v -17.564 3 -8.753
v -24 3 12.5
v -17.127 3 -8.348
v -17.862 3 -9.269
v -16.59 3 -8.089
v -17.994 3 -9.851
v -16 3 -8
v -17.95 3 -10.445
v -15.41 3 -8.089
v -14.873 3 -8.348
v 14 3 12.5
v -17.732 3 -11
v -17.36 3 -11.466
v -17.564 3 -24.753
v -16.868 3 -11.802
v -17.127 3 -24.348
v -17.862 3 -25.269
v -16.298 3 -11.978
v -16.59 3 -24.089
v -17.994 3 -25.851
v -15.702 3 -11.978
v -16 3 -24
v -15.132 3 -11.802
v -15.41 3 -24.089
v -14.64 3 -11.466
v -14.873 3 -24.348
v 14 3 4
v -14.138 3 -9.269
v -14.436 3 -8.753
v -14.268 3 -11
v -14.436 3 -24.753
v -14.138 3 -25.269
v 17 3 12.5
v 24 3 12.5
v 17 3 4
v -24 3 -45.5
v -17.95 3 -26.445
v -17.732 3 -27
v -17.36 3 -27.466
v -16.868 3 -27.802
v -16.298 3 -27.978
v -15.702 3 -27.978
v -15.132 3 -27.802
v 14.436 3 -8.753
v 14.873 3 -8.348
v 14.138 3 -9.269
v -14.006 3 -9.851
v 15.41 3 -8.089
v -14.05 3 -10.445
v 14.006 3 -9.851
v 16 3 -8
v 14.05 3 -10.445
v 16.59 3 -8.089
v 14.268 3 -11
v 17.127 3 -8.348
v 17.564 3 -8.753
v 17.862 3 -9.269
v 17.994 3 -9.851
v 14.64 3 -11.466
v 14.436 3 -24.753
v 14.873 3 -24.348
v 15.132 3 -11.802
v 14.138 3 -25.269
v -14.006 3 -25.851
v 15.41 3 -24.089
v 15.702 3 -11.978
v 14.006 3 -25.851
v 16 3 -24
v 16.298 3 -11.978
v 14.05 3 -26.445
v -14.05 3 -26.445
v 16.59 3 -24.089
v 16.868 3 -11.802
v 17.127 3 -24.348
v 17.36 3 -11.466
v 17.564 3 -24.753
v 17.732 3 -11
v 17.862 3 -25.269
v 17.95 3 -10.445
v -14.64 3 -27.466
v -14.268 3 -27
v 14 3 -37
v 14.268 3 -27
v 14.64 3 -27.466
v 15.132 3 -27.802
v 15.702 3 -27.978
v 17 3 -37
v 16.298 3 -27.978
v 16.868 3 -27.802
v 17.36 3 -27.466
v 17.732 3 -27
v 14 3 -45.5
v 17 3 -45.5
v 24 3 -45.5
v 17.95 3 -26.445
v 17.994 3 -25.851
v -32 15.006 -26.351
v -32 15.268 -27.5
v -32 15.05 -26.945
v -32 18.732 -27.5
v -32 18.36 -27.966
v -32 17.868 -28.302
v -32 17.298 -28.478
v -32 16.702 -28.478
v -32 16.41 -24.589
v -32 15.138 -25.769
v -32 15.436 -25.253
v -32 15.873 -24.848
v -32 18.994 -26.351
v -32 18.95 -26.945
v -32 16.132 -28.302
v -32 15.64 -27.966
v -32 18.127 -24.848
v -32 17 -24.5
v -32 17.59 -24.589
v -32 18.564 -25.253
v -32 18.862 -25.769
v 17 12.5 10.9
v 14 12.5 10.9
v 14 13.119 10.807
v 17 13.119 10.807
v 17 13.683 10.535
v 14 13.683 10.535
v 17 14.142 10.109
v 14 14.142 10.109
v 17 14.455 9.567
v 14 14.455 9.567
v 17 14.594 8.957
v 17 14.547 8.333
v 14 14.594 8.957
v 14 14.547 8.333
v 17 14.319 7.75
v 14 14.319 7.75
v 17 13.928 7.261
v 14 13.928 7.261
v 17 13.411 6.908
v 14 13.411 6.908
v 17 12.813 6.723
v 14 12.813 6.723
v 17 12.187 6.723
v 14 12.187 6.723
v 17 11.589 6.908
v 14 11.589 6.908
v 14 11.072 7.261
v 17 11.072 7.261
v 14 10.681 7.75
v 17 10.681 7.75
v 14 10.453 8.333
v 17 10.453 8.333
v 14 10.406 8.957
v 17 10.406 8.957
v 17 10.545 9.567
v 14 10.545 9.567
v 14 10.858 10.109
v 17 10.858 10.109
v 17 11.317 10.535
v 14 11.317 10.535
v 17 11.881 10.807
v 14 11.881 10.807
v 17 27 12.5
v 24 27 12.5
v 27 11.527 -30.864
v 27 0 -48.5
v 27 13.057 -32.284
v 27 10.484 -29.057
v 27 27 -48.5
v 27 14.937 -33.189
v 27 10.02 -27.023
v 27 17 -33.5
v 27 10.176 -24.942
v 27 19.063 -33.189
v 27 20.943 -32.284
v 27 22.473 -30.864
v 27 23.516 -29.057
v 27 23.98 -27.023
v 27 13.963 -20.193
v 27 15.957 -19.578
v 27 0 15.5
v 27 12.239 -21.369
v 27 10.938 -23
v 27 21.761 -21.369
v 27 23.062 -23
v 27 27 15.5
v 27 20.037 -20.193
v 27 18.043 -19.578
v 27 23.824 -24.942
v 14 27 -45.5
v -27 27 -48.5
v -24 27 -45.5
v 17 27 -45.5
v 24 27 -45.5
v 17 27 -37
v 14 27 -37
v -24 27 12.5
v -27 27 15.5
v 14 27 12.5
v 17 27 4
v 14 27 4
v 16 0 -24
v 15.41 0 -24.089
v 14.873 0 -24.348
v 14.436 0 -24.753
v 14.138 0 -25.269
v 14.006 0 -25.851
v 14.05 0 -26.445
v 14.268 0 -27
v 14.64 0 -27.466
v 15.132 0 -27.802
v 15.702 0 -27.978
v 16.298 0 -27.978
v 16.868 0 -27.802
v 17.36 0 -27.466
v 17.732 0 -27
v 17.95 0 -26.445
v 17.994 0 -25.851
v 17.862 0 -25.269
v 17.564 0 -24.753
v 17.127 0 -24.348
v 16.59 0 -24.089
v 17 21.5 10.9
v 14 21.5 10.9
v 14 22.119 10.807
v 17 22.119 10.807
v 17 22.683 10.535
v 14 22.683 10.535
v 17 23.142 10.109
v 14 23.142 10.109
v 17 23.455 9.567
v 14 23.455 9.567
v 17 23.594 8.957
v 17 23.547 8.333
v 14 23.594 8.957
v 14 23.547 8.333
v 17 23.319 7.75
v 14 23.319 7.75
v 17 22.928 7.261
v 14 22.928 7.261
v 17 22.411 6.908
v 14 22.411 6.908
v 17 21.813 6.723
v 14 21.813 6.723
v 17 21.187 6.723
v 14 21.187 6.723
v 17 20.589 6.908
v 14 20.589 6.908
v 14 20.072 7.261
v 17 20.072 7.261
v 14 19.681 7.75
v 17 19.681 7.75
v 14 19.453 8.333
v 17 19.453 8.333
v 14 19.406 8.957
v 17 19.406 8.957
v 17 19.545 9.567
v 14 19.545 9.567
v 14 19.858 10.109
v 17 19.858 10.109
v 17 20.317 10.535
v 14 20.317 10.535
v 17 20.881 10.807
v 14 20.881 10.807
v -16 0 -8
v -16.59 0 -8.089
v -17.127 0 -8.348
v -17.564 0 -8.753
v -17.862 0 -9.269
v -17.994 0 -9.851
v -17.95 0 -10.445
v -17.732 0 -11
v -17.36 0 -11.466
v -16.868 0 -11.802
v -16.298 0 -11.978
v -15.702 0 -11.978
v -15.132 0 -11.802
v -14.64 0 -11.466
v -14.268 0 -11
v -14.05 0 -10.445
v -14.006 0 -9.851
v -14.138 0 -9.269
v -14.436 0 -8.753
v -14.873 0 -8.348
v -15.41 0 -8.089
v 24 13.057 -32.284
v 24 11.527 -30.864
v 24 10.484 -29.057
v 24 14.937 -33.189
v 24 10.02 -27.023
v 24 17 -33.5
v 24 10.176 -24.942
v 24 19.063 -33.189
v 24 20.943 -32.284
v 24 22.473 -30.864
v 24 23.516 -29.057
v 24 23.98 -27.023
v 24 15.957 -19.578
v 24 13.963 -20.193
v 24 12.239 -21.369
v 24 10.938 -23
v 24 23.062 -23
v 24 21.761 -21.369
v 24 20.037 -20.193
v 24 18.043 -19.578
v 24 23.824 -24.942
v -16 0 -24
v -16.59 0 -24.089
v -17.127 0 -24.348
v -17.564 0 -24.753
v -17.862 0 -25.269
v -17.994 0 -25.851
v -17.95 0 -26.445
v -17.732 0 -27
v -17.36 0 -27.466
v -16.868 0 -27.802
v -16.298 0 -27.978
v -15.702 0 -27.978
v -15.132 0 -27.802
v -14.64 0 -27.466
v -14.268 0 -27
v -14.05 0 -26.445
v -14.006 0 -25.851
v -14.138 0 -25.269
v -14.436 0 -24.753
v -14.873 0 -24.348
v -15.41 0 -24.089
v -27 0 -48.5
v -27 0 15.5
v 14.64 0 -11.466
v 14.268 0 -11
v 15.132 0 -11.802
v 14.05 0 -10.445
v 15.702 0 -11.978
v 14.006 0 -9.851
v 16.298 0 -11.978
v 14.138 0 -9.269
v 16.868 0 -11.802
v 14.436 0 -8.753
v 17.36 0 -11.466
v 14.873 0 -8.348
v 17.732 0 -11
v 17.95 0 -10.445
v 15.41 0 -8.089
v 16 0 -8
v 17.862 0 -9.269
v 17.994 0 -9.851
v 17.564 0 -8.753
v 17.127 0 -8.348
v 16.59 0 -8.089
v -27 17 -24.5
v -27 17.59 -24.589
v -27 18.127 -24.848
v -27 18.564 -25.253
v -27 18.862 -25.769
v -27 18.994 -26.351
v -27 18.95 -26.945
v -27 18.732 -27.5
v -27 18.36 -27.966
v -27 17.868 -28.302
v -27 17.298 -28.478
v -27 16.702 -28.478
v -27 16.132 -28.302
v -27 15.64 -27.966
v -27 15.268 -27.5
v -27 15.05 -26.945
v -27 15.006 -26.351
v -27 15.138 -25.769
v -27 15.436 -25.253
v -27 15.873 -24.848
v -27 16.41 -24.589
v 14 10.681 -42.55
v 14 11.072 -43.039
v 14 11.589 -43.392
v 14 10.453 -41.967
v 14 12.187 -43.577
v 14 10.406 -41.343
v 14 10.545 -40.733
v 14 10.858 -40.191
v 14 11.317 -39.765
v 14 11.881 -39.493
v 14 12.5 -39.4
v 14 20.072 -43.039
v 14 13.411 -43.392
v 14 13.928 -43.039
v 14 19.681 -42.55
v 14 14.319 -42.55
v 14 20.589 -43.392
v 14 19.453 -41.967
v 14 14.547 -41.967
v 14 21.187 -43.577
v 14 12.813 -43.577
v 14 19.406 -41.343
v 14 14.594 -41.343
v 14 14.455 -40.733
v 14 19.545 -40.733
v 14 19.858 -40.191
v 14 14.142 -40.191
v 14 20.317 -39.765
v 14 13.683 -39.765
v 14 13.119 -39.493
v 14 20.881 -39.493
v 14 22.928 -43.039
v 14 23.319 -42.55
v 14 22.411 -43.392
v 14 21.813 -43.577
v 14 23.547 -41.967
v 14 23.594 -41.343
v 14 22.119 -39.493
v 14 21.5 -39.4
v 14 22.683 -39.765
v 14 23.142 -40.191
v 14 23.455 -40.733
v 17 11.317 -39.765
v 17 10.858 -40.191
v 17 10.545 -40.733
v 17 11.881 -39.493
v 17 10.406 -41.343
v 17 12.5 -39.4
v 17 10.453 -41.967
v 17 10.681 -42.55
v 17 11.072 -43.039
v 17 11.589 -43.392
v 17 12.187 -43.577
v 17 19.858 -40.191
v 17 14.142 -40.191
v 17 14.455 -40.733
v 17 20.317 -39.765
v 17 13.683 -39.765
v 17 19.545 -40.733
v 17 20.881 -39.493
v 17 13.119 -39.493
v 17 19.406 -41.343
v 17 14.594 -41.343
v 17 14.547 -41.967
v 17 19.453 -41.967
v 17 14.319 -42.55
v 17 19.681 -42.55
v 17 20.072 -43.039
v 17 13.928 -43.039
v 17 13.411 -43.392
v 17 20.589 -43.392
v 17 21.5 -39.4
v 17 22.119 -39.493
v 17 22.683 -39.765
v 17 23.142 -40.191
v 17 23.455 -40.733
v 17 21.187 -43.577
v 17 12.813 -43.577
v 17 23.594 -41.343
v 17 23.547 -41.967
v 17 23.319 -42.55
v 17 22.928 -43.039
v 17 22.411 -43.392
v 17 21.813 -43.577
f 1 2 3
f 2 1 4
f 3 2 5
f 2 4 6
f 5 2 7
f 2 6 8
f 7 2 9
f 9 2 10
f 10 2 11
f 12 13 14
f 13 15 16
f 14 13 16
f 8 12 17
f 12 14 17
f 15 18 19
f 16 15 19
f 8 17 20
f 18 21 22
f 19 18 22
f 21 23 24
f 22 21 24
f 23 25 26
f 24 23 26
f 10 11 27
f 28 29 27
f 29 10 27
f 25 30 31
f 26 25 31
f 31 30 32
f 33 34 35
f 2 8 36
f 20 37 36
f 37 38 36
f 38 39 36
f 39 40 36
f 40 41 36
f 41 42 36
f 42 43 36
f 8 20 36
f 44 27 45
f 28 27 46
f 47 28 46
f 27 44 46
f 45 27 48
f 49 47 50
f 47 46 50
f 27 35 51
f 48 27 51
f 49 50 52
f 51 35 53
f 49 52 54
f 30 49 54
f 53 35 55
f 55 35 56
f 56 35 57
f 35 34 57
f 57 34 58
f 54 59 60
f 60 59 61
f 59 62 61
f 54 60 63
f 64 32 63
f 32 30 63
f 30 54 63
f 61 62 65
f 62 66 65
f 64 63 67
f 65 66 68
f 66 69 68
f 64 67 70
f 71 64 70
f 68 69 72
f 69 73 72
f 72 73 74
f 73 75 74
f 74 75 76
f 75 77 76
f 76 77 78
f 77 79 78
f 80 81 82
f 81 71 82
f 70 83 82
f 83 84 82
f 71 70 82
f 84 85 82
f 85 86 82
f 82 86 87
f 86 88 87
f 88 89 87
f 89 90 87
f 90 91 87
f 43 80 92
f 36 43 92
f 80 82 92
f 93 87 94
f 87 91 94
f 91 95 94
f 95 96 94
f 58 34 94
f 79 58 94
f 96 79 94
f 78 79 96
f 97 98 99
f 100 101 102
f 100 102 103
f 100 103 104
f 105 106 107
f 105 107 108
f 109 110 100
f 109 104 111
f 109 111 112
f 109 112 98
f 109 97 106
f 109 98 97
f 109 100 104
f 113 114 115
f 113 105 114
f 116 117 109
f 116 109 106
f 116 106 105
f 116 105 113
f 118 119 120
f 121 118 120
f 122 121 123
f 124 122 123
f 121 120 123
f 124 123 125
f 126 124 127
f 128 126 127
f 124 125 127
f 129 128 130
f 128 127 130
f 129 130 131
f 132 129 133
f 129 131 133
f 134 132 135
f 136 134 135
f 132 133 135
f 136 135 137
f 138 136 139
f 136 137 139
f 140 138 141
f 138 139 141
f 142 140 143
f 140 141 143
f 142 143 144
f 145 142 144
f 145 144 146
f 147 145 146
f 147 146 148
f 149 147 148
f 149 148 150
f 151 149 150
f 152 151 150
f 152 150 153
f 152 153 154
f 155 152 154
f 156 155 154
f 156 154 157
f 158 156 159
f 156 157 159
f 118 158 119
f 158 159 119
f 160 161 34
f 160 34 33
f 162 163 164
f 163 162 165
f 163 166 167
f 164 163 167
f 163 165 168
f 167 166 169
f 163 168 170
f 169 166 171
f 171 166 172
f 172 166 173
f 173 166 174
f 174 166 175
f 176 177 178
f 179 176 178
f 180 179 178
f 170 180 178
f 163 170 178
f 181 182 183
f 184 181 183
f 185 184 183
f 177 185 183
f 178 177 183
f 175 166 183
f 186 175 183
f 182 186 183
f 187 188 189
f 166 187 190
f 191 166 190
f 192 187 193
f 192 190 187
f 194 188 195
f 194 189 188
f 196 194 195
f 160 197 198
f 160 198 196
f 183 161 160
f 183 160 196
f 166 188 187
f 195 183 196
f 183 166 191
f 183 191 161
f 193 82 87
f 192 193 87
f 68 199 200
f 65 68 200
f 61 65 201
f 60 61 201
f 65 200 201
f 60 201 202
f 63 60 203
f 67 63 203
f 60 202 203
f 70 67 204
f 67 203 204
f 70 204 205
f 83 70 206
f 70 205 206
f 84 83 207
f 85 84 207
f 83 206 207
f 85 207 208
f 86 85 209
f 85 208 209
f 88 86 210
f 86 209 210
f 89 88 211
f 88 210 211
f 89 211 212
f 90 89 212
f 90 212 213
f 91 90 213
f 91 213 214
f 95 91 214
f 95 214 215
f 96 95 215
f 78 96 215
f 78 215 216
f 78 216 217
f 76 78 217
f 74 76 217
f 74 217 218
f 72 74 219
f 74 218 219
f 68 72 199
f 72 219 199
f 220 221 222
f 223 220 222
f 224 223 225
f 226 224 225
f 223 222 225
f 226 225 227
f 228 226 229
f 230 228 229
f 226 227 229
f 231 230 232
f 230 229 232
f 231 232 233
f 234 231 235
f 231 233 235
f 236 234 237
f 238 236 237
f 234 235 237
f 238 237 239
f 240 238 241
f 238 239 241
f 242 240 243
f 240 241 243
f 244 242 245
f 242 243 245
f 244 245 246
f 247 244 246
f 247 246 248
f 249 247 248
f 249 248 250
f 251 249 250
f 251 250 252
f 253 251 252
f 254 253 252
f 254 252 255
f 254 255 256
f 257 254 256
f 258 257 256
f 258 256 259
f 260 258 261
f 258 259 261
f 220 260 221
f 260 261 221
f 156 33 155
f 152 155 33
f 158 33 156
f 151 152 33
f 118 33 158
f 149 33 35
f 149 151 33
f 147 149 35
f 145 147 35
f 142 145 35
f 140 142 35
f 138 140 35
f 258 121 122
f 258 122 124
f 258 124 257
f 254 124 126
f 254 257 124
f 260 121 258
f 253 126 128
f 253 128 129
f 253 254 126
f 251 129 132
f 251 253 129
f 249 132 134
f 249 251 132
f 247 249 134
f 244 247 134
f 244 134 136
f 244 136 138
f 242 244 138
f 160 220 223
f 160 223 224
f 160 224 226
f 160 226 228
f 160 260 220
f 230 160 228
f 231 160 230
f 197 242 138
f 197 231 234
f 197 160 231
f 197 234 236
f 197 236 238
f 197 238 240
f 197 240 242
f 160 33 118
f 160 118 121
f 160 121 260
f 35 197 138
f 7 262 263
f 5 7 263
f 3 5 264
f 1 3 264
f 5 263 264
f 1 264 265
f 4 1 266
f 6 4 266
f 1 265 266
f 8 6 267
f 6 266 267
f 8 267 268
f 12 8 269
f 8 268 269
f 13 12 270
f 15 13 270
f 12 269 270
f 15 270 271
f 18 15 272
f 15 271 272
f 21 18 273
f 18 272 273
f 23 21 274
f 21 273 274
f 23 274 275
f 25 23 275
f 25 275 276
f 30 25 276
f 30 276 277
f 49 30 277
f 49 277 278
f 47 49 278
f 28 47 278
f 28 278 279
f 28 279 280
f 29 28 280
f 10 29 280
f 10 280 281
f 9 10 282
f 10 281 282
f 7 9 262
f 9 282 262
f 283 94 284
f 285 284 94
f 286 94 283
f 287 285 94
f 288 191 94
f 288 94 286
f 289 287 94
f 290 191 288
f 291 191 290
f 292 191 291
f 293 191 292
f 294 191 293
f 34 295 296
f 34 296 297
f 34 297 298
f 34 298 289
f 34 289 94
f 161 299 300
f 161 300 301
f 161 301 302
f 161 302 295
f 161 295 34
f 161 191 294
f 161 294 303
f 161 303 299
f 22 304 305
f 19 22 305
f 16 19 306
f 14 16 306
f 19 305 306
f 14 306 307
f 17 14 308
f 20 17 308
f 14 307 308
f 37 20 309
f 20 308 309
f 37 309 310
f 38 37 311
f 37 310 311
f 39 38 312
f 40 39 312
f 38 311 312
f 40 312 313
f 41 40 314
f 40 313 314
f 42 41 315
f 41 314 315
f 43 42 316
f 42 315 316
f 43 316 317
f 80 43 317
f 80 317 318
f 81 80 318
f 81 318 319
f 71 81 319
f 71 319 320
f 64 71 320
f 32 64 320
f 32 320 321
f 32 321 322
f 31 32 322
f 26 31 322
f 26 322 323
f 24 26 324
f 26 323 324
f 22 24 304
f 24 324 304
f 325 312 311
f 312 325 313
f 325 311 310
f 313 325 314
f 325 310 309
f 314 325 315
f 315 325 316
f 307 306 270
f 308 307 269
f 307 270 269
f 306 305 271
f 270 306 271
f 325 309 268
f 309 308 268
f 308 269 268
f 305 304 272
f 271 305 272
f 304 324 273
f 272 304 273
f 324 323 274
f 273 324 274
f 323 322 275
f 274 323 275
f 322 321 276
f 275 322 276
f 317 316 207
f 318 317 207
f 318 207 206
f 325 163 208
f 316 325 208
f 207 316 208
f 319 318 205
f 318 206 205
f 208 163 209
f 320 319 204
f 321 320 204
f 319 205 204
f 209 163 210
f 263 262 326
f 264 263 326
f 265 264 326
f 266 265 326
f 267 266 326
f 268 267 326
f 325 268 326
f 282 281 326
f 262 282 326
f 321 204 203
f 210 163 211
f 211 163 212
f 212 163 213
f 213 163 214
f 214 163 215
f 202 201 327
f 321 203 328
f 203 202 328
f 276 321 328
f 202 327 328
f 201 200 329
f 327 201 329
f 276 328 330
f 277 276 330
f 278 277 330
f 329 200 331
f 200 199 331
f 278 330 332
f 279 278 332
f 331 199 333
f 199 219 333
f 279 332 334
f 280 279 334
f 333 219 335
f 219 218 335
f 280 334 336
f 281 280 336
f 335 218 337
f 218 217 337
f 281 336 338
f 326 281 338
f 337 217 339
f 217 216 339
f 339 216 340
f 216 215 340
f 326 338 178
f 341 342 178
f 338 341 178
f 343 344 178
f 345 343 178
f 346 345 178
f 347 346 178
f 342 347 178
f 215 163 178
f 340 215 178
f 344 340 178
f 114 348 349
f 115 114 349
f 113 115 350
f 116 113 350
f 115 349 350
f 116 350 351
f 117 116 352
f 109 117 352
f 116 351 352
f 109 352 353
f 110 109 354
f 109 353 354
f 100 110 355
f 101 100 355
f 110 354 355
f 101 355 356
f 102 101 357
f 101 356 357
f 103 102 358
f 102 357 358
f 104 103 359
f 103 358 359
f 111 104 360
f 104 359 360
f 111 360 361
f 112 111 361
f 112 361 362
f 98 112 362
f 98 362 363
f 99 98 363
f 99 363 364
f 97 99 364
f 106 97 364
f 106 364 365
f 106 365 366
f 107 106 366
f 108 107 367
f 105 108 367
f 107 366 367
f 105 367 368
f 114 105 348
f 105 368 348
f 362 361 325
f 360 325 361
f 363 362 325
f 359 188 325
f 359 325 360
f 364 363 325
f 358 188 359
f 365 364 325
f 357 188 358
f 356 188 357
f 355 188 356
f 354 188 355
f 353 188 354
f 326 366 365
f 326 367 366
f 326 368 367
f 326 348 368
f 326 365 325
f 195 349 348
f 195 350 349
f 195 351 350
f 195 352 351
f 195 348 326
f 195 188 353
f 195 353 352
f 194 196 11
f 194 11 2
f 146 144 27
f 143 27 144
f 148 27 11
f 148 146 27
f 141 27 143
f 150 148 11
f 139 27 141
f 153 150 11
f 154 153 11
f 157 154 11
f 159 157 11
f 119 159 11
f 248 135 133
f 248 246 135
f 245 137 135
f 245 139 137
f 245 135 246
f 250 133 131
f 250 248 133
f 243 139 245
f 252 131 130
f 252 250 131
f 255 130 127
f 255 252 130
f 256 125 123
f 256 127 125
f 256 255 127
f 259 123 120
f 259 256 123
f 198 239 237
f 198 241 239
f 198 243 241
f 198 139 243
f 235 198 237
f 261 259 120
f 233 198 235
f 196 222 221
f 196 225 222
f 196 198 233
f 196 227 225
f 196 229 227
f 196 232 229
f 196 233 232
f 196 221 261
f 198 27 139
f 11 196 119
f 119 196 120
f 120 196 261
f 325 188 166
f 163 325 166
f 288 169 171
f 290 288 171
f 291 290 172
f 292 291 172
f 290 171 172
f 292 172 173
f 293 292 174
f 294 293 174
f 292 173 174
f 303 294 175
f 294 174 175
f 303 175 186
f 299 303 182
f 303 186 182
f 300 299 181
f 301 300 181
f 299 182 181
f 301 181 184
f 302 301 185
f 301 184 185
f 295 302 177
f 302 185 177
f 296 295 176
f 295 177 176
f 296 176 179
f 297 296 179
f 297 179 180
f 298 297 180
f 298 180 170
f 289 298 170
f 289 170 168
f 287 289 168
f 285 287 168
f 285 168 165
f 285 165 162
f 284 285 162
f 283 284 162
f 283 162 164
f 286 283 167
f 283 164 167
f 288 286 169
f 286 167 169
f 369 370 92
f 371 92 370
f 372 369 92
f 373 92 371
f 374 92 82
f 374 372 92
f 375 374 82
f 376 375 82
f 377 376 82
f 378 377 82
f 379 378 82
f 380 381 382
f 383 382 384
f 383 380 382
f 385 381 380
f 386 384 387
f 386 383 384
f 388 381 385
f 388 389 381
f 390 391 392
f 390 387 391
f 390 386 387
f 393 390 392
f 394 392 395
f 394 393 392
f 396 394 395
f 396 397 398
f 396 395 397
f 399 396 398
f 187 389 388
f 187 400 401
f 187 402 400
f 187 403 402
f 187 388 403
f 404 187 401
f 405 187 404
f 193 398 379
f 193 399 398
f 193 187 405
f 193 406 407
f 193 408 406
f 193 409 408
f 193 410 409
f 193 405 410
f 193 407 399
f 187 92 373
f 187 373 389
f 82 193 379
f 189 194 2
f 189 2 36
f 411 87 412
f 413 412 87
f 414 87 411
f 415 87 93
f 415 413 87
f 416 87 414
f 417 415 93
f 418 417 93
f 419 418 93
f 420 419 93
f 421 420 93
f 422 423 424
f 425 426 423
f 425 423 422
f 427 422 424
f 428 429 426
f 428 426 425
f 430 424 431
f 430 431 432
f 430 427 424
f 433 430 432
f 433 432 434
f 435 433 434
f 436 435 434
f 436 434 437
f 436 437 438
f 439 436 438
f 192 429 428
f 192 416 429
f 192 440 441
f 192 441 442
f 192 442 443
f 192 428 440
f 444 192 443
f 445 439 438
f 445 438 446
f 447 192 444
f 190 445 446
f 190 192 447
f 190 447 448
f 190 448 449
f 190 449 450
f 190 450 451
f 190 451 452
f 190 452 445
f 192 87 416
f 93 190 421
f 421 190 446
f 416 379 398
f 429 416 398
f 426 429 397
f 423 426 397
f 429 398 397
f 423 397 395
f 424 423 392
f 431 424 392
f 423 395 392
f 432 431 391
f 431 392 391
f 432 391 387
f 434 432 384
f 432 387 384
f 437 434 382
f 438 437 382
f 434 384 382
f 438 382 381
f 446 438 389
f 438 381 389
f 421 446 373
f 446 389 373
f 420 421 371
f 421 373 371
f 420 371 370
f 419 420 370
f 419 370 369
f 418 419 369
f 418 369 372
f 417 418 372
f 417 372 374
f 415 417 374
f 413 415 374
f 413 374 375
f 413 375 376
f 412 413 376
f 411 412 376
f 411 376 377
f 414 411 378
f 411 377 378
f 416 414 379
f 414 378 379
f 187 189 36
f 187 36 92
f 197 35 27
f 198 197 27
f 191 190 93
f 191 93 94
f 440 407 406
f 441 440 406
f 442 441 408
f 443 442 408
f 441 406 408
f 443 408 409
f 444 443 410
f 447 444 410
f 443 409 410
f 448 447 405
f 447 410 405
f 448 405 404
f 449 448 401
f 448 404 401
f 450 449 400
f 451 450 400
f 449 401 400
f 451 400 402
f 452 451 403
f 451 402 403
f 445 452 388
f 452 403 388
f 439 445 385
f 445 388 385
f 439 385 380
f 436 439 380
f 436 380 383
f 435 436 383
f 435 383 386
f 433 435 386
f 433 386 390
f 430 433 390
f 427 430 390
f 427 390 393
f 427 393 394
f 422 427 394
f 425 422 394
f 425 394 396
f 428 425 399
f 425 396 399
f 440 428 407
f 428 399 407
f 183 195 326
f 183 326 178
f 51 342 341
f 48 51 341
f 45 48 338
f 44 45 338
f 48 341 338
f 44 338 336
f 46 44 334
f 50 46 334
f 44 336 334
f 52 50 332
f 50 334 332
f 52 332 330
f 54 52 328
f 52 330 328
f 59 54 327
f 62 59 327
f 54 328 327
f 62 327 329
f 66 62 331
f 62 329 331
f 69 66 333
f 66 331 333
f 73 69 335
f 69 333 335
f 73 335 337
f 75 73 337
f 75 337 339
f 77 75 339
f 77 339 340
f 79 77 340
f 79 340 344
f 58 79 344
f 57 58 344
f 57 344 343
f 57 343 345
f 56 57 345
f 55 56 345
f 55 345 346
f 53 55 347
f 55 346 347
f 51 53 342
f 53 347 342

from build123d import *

# Parameters (mm, degrees)
SKETCH_W             = 64
SKETCH_H             = 54
PAD_DEPTH            = 27
POCKET_DEPTH         = 24
SKETCH002_R          = 2.1
POCKET001_DEPTH      = 3
SKETCH003_R          = 7
POCKET002_DEPTH      = 3
SKETCH004_R          = 2
PAD001_DEPTH         = 5
SKETCH011_R          = 2
POCKET006_DEPTH      = 3
BODY_PITCH_ANGLE     = -90
BODY_PLACEMENT_ANGLE = -90


with BuildPart() as part:
    # Sketch → Pad (new body)
    with BuildSketch(Plane.XY):
        with Locations((20, 15)):
            Rectangle(SKETCH_W, SKETCH_H)
    extrude(amount=-PAD_DEPTH)

    # Sketch001 (on Face5 of Pad) → Pocket (cut)
    with BuildSketch(Plane.XY):
        Polygon((-9, 32), (-9, 39), (49, 39), (49, 32), (40.5, 32), (40.5, 29), (49, 29), (49, -9), (-9, -9), (-9, 29), (-0.5, 29), (-0.5, 32), align=None)
    extrude(amount=-POCKET_DEPTH, mode=Mode.SUBTRACT)

    # Sketch002 (on Face16 of Pocket) → Pocket001 (cut)
    with BuildSketch(Plane.XZ.offset(-29)):
        with Locations((45.3, -5.5)):
            Circle(SKETCH002_R)
        with Locations((45.3, -14.5)):
            Circle(SKETCH002_R)
        with Locations((-5, -5.5)):
            Circle(SKETCH002_R)
        with Locations((-5, -14.5)):
            Circle(SKETCH002_R)
    extrude(amount=-POCKET001_DEPTH, mode=Mode.SUBTRACT)

    # Sketch003 (on Face1 of Pocket001) → Pocket002 (cut)
    with BuildSketch(Plane(origin=(0, 42, 0), x_dir=(-1, 0, 0), z_dir=(0, 1, 0))):
        with Locations((-10, -10)):
            Circle(SKETCH003_R)
    extrude(amount=-POCKET002_DEPTH, mode=Mode.SUBTRACT)

    # Sketch004 (on Face7 of Pocket002) → Pad001 (join)
    with BuildSketch(Plane.XZ.offset(12)):
        with Locations((10, -10)):
            Circle(SKETCH004_R)
    extrude(amount=PAD001_DEPTH)

    # Sketch011 (on Face5 of Pocket) → Pocket006 (cut)
    with BuildSketch(Plane(origin=(0, 0, -27), x_dir=(1, 0, 0), z_dir=(0, 0, -1))):
        with Locations((26.5, 1)):
            Circle(SKETCH011_R)
        with Locations((10.5, 1)):
            Circle(SKETCH011_R)
        with Locations((26.5, -31)):
            Circle(SKETCH011_R)
        with Locations((10.5, -31)):
            Circle(SKETCH011_R)
    extrude(amount=-POCKET006_DEPTH, mode=Mode.SUBTRACT)


with BuildPart() as part_1:
    # Body pitch: moved
    add(part.part.rotate(Axis((0, 0, 0), (0, 1, 0)), BODY_PITCH_ANGLE))


with BuildPart() as part_2:
    # Body placement: moved
    add(part_1.part.moved(Location((-15, 27, -36.5))).rotate(Axis((-15, 27, -36.5), (0, 0, 1)), BODY_PLACEMENT_ANGLE))


solid = part_2.part
